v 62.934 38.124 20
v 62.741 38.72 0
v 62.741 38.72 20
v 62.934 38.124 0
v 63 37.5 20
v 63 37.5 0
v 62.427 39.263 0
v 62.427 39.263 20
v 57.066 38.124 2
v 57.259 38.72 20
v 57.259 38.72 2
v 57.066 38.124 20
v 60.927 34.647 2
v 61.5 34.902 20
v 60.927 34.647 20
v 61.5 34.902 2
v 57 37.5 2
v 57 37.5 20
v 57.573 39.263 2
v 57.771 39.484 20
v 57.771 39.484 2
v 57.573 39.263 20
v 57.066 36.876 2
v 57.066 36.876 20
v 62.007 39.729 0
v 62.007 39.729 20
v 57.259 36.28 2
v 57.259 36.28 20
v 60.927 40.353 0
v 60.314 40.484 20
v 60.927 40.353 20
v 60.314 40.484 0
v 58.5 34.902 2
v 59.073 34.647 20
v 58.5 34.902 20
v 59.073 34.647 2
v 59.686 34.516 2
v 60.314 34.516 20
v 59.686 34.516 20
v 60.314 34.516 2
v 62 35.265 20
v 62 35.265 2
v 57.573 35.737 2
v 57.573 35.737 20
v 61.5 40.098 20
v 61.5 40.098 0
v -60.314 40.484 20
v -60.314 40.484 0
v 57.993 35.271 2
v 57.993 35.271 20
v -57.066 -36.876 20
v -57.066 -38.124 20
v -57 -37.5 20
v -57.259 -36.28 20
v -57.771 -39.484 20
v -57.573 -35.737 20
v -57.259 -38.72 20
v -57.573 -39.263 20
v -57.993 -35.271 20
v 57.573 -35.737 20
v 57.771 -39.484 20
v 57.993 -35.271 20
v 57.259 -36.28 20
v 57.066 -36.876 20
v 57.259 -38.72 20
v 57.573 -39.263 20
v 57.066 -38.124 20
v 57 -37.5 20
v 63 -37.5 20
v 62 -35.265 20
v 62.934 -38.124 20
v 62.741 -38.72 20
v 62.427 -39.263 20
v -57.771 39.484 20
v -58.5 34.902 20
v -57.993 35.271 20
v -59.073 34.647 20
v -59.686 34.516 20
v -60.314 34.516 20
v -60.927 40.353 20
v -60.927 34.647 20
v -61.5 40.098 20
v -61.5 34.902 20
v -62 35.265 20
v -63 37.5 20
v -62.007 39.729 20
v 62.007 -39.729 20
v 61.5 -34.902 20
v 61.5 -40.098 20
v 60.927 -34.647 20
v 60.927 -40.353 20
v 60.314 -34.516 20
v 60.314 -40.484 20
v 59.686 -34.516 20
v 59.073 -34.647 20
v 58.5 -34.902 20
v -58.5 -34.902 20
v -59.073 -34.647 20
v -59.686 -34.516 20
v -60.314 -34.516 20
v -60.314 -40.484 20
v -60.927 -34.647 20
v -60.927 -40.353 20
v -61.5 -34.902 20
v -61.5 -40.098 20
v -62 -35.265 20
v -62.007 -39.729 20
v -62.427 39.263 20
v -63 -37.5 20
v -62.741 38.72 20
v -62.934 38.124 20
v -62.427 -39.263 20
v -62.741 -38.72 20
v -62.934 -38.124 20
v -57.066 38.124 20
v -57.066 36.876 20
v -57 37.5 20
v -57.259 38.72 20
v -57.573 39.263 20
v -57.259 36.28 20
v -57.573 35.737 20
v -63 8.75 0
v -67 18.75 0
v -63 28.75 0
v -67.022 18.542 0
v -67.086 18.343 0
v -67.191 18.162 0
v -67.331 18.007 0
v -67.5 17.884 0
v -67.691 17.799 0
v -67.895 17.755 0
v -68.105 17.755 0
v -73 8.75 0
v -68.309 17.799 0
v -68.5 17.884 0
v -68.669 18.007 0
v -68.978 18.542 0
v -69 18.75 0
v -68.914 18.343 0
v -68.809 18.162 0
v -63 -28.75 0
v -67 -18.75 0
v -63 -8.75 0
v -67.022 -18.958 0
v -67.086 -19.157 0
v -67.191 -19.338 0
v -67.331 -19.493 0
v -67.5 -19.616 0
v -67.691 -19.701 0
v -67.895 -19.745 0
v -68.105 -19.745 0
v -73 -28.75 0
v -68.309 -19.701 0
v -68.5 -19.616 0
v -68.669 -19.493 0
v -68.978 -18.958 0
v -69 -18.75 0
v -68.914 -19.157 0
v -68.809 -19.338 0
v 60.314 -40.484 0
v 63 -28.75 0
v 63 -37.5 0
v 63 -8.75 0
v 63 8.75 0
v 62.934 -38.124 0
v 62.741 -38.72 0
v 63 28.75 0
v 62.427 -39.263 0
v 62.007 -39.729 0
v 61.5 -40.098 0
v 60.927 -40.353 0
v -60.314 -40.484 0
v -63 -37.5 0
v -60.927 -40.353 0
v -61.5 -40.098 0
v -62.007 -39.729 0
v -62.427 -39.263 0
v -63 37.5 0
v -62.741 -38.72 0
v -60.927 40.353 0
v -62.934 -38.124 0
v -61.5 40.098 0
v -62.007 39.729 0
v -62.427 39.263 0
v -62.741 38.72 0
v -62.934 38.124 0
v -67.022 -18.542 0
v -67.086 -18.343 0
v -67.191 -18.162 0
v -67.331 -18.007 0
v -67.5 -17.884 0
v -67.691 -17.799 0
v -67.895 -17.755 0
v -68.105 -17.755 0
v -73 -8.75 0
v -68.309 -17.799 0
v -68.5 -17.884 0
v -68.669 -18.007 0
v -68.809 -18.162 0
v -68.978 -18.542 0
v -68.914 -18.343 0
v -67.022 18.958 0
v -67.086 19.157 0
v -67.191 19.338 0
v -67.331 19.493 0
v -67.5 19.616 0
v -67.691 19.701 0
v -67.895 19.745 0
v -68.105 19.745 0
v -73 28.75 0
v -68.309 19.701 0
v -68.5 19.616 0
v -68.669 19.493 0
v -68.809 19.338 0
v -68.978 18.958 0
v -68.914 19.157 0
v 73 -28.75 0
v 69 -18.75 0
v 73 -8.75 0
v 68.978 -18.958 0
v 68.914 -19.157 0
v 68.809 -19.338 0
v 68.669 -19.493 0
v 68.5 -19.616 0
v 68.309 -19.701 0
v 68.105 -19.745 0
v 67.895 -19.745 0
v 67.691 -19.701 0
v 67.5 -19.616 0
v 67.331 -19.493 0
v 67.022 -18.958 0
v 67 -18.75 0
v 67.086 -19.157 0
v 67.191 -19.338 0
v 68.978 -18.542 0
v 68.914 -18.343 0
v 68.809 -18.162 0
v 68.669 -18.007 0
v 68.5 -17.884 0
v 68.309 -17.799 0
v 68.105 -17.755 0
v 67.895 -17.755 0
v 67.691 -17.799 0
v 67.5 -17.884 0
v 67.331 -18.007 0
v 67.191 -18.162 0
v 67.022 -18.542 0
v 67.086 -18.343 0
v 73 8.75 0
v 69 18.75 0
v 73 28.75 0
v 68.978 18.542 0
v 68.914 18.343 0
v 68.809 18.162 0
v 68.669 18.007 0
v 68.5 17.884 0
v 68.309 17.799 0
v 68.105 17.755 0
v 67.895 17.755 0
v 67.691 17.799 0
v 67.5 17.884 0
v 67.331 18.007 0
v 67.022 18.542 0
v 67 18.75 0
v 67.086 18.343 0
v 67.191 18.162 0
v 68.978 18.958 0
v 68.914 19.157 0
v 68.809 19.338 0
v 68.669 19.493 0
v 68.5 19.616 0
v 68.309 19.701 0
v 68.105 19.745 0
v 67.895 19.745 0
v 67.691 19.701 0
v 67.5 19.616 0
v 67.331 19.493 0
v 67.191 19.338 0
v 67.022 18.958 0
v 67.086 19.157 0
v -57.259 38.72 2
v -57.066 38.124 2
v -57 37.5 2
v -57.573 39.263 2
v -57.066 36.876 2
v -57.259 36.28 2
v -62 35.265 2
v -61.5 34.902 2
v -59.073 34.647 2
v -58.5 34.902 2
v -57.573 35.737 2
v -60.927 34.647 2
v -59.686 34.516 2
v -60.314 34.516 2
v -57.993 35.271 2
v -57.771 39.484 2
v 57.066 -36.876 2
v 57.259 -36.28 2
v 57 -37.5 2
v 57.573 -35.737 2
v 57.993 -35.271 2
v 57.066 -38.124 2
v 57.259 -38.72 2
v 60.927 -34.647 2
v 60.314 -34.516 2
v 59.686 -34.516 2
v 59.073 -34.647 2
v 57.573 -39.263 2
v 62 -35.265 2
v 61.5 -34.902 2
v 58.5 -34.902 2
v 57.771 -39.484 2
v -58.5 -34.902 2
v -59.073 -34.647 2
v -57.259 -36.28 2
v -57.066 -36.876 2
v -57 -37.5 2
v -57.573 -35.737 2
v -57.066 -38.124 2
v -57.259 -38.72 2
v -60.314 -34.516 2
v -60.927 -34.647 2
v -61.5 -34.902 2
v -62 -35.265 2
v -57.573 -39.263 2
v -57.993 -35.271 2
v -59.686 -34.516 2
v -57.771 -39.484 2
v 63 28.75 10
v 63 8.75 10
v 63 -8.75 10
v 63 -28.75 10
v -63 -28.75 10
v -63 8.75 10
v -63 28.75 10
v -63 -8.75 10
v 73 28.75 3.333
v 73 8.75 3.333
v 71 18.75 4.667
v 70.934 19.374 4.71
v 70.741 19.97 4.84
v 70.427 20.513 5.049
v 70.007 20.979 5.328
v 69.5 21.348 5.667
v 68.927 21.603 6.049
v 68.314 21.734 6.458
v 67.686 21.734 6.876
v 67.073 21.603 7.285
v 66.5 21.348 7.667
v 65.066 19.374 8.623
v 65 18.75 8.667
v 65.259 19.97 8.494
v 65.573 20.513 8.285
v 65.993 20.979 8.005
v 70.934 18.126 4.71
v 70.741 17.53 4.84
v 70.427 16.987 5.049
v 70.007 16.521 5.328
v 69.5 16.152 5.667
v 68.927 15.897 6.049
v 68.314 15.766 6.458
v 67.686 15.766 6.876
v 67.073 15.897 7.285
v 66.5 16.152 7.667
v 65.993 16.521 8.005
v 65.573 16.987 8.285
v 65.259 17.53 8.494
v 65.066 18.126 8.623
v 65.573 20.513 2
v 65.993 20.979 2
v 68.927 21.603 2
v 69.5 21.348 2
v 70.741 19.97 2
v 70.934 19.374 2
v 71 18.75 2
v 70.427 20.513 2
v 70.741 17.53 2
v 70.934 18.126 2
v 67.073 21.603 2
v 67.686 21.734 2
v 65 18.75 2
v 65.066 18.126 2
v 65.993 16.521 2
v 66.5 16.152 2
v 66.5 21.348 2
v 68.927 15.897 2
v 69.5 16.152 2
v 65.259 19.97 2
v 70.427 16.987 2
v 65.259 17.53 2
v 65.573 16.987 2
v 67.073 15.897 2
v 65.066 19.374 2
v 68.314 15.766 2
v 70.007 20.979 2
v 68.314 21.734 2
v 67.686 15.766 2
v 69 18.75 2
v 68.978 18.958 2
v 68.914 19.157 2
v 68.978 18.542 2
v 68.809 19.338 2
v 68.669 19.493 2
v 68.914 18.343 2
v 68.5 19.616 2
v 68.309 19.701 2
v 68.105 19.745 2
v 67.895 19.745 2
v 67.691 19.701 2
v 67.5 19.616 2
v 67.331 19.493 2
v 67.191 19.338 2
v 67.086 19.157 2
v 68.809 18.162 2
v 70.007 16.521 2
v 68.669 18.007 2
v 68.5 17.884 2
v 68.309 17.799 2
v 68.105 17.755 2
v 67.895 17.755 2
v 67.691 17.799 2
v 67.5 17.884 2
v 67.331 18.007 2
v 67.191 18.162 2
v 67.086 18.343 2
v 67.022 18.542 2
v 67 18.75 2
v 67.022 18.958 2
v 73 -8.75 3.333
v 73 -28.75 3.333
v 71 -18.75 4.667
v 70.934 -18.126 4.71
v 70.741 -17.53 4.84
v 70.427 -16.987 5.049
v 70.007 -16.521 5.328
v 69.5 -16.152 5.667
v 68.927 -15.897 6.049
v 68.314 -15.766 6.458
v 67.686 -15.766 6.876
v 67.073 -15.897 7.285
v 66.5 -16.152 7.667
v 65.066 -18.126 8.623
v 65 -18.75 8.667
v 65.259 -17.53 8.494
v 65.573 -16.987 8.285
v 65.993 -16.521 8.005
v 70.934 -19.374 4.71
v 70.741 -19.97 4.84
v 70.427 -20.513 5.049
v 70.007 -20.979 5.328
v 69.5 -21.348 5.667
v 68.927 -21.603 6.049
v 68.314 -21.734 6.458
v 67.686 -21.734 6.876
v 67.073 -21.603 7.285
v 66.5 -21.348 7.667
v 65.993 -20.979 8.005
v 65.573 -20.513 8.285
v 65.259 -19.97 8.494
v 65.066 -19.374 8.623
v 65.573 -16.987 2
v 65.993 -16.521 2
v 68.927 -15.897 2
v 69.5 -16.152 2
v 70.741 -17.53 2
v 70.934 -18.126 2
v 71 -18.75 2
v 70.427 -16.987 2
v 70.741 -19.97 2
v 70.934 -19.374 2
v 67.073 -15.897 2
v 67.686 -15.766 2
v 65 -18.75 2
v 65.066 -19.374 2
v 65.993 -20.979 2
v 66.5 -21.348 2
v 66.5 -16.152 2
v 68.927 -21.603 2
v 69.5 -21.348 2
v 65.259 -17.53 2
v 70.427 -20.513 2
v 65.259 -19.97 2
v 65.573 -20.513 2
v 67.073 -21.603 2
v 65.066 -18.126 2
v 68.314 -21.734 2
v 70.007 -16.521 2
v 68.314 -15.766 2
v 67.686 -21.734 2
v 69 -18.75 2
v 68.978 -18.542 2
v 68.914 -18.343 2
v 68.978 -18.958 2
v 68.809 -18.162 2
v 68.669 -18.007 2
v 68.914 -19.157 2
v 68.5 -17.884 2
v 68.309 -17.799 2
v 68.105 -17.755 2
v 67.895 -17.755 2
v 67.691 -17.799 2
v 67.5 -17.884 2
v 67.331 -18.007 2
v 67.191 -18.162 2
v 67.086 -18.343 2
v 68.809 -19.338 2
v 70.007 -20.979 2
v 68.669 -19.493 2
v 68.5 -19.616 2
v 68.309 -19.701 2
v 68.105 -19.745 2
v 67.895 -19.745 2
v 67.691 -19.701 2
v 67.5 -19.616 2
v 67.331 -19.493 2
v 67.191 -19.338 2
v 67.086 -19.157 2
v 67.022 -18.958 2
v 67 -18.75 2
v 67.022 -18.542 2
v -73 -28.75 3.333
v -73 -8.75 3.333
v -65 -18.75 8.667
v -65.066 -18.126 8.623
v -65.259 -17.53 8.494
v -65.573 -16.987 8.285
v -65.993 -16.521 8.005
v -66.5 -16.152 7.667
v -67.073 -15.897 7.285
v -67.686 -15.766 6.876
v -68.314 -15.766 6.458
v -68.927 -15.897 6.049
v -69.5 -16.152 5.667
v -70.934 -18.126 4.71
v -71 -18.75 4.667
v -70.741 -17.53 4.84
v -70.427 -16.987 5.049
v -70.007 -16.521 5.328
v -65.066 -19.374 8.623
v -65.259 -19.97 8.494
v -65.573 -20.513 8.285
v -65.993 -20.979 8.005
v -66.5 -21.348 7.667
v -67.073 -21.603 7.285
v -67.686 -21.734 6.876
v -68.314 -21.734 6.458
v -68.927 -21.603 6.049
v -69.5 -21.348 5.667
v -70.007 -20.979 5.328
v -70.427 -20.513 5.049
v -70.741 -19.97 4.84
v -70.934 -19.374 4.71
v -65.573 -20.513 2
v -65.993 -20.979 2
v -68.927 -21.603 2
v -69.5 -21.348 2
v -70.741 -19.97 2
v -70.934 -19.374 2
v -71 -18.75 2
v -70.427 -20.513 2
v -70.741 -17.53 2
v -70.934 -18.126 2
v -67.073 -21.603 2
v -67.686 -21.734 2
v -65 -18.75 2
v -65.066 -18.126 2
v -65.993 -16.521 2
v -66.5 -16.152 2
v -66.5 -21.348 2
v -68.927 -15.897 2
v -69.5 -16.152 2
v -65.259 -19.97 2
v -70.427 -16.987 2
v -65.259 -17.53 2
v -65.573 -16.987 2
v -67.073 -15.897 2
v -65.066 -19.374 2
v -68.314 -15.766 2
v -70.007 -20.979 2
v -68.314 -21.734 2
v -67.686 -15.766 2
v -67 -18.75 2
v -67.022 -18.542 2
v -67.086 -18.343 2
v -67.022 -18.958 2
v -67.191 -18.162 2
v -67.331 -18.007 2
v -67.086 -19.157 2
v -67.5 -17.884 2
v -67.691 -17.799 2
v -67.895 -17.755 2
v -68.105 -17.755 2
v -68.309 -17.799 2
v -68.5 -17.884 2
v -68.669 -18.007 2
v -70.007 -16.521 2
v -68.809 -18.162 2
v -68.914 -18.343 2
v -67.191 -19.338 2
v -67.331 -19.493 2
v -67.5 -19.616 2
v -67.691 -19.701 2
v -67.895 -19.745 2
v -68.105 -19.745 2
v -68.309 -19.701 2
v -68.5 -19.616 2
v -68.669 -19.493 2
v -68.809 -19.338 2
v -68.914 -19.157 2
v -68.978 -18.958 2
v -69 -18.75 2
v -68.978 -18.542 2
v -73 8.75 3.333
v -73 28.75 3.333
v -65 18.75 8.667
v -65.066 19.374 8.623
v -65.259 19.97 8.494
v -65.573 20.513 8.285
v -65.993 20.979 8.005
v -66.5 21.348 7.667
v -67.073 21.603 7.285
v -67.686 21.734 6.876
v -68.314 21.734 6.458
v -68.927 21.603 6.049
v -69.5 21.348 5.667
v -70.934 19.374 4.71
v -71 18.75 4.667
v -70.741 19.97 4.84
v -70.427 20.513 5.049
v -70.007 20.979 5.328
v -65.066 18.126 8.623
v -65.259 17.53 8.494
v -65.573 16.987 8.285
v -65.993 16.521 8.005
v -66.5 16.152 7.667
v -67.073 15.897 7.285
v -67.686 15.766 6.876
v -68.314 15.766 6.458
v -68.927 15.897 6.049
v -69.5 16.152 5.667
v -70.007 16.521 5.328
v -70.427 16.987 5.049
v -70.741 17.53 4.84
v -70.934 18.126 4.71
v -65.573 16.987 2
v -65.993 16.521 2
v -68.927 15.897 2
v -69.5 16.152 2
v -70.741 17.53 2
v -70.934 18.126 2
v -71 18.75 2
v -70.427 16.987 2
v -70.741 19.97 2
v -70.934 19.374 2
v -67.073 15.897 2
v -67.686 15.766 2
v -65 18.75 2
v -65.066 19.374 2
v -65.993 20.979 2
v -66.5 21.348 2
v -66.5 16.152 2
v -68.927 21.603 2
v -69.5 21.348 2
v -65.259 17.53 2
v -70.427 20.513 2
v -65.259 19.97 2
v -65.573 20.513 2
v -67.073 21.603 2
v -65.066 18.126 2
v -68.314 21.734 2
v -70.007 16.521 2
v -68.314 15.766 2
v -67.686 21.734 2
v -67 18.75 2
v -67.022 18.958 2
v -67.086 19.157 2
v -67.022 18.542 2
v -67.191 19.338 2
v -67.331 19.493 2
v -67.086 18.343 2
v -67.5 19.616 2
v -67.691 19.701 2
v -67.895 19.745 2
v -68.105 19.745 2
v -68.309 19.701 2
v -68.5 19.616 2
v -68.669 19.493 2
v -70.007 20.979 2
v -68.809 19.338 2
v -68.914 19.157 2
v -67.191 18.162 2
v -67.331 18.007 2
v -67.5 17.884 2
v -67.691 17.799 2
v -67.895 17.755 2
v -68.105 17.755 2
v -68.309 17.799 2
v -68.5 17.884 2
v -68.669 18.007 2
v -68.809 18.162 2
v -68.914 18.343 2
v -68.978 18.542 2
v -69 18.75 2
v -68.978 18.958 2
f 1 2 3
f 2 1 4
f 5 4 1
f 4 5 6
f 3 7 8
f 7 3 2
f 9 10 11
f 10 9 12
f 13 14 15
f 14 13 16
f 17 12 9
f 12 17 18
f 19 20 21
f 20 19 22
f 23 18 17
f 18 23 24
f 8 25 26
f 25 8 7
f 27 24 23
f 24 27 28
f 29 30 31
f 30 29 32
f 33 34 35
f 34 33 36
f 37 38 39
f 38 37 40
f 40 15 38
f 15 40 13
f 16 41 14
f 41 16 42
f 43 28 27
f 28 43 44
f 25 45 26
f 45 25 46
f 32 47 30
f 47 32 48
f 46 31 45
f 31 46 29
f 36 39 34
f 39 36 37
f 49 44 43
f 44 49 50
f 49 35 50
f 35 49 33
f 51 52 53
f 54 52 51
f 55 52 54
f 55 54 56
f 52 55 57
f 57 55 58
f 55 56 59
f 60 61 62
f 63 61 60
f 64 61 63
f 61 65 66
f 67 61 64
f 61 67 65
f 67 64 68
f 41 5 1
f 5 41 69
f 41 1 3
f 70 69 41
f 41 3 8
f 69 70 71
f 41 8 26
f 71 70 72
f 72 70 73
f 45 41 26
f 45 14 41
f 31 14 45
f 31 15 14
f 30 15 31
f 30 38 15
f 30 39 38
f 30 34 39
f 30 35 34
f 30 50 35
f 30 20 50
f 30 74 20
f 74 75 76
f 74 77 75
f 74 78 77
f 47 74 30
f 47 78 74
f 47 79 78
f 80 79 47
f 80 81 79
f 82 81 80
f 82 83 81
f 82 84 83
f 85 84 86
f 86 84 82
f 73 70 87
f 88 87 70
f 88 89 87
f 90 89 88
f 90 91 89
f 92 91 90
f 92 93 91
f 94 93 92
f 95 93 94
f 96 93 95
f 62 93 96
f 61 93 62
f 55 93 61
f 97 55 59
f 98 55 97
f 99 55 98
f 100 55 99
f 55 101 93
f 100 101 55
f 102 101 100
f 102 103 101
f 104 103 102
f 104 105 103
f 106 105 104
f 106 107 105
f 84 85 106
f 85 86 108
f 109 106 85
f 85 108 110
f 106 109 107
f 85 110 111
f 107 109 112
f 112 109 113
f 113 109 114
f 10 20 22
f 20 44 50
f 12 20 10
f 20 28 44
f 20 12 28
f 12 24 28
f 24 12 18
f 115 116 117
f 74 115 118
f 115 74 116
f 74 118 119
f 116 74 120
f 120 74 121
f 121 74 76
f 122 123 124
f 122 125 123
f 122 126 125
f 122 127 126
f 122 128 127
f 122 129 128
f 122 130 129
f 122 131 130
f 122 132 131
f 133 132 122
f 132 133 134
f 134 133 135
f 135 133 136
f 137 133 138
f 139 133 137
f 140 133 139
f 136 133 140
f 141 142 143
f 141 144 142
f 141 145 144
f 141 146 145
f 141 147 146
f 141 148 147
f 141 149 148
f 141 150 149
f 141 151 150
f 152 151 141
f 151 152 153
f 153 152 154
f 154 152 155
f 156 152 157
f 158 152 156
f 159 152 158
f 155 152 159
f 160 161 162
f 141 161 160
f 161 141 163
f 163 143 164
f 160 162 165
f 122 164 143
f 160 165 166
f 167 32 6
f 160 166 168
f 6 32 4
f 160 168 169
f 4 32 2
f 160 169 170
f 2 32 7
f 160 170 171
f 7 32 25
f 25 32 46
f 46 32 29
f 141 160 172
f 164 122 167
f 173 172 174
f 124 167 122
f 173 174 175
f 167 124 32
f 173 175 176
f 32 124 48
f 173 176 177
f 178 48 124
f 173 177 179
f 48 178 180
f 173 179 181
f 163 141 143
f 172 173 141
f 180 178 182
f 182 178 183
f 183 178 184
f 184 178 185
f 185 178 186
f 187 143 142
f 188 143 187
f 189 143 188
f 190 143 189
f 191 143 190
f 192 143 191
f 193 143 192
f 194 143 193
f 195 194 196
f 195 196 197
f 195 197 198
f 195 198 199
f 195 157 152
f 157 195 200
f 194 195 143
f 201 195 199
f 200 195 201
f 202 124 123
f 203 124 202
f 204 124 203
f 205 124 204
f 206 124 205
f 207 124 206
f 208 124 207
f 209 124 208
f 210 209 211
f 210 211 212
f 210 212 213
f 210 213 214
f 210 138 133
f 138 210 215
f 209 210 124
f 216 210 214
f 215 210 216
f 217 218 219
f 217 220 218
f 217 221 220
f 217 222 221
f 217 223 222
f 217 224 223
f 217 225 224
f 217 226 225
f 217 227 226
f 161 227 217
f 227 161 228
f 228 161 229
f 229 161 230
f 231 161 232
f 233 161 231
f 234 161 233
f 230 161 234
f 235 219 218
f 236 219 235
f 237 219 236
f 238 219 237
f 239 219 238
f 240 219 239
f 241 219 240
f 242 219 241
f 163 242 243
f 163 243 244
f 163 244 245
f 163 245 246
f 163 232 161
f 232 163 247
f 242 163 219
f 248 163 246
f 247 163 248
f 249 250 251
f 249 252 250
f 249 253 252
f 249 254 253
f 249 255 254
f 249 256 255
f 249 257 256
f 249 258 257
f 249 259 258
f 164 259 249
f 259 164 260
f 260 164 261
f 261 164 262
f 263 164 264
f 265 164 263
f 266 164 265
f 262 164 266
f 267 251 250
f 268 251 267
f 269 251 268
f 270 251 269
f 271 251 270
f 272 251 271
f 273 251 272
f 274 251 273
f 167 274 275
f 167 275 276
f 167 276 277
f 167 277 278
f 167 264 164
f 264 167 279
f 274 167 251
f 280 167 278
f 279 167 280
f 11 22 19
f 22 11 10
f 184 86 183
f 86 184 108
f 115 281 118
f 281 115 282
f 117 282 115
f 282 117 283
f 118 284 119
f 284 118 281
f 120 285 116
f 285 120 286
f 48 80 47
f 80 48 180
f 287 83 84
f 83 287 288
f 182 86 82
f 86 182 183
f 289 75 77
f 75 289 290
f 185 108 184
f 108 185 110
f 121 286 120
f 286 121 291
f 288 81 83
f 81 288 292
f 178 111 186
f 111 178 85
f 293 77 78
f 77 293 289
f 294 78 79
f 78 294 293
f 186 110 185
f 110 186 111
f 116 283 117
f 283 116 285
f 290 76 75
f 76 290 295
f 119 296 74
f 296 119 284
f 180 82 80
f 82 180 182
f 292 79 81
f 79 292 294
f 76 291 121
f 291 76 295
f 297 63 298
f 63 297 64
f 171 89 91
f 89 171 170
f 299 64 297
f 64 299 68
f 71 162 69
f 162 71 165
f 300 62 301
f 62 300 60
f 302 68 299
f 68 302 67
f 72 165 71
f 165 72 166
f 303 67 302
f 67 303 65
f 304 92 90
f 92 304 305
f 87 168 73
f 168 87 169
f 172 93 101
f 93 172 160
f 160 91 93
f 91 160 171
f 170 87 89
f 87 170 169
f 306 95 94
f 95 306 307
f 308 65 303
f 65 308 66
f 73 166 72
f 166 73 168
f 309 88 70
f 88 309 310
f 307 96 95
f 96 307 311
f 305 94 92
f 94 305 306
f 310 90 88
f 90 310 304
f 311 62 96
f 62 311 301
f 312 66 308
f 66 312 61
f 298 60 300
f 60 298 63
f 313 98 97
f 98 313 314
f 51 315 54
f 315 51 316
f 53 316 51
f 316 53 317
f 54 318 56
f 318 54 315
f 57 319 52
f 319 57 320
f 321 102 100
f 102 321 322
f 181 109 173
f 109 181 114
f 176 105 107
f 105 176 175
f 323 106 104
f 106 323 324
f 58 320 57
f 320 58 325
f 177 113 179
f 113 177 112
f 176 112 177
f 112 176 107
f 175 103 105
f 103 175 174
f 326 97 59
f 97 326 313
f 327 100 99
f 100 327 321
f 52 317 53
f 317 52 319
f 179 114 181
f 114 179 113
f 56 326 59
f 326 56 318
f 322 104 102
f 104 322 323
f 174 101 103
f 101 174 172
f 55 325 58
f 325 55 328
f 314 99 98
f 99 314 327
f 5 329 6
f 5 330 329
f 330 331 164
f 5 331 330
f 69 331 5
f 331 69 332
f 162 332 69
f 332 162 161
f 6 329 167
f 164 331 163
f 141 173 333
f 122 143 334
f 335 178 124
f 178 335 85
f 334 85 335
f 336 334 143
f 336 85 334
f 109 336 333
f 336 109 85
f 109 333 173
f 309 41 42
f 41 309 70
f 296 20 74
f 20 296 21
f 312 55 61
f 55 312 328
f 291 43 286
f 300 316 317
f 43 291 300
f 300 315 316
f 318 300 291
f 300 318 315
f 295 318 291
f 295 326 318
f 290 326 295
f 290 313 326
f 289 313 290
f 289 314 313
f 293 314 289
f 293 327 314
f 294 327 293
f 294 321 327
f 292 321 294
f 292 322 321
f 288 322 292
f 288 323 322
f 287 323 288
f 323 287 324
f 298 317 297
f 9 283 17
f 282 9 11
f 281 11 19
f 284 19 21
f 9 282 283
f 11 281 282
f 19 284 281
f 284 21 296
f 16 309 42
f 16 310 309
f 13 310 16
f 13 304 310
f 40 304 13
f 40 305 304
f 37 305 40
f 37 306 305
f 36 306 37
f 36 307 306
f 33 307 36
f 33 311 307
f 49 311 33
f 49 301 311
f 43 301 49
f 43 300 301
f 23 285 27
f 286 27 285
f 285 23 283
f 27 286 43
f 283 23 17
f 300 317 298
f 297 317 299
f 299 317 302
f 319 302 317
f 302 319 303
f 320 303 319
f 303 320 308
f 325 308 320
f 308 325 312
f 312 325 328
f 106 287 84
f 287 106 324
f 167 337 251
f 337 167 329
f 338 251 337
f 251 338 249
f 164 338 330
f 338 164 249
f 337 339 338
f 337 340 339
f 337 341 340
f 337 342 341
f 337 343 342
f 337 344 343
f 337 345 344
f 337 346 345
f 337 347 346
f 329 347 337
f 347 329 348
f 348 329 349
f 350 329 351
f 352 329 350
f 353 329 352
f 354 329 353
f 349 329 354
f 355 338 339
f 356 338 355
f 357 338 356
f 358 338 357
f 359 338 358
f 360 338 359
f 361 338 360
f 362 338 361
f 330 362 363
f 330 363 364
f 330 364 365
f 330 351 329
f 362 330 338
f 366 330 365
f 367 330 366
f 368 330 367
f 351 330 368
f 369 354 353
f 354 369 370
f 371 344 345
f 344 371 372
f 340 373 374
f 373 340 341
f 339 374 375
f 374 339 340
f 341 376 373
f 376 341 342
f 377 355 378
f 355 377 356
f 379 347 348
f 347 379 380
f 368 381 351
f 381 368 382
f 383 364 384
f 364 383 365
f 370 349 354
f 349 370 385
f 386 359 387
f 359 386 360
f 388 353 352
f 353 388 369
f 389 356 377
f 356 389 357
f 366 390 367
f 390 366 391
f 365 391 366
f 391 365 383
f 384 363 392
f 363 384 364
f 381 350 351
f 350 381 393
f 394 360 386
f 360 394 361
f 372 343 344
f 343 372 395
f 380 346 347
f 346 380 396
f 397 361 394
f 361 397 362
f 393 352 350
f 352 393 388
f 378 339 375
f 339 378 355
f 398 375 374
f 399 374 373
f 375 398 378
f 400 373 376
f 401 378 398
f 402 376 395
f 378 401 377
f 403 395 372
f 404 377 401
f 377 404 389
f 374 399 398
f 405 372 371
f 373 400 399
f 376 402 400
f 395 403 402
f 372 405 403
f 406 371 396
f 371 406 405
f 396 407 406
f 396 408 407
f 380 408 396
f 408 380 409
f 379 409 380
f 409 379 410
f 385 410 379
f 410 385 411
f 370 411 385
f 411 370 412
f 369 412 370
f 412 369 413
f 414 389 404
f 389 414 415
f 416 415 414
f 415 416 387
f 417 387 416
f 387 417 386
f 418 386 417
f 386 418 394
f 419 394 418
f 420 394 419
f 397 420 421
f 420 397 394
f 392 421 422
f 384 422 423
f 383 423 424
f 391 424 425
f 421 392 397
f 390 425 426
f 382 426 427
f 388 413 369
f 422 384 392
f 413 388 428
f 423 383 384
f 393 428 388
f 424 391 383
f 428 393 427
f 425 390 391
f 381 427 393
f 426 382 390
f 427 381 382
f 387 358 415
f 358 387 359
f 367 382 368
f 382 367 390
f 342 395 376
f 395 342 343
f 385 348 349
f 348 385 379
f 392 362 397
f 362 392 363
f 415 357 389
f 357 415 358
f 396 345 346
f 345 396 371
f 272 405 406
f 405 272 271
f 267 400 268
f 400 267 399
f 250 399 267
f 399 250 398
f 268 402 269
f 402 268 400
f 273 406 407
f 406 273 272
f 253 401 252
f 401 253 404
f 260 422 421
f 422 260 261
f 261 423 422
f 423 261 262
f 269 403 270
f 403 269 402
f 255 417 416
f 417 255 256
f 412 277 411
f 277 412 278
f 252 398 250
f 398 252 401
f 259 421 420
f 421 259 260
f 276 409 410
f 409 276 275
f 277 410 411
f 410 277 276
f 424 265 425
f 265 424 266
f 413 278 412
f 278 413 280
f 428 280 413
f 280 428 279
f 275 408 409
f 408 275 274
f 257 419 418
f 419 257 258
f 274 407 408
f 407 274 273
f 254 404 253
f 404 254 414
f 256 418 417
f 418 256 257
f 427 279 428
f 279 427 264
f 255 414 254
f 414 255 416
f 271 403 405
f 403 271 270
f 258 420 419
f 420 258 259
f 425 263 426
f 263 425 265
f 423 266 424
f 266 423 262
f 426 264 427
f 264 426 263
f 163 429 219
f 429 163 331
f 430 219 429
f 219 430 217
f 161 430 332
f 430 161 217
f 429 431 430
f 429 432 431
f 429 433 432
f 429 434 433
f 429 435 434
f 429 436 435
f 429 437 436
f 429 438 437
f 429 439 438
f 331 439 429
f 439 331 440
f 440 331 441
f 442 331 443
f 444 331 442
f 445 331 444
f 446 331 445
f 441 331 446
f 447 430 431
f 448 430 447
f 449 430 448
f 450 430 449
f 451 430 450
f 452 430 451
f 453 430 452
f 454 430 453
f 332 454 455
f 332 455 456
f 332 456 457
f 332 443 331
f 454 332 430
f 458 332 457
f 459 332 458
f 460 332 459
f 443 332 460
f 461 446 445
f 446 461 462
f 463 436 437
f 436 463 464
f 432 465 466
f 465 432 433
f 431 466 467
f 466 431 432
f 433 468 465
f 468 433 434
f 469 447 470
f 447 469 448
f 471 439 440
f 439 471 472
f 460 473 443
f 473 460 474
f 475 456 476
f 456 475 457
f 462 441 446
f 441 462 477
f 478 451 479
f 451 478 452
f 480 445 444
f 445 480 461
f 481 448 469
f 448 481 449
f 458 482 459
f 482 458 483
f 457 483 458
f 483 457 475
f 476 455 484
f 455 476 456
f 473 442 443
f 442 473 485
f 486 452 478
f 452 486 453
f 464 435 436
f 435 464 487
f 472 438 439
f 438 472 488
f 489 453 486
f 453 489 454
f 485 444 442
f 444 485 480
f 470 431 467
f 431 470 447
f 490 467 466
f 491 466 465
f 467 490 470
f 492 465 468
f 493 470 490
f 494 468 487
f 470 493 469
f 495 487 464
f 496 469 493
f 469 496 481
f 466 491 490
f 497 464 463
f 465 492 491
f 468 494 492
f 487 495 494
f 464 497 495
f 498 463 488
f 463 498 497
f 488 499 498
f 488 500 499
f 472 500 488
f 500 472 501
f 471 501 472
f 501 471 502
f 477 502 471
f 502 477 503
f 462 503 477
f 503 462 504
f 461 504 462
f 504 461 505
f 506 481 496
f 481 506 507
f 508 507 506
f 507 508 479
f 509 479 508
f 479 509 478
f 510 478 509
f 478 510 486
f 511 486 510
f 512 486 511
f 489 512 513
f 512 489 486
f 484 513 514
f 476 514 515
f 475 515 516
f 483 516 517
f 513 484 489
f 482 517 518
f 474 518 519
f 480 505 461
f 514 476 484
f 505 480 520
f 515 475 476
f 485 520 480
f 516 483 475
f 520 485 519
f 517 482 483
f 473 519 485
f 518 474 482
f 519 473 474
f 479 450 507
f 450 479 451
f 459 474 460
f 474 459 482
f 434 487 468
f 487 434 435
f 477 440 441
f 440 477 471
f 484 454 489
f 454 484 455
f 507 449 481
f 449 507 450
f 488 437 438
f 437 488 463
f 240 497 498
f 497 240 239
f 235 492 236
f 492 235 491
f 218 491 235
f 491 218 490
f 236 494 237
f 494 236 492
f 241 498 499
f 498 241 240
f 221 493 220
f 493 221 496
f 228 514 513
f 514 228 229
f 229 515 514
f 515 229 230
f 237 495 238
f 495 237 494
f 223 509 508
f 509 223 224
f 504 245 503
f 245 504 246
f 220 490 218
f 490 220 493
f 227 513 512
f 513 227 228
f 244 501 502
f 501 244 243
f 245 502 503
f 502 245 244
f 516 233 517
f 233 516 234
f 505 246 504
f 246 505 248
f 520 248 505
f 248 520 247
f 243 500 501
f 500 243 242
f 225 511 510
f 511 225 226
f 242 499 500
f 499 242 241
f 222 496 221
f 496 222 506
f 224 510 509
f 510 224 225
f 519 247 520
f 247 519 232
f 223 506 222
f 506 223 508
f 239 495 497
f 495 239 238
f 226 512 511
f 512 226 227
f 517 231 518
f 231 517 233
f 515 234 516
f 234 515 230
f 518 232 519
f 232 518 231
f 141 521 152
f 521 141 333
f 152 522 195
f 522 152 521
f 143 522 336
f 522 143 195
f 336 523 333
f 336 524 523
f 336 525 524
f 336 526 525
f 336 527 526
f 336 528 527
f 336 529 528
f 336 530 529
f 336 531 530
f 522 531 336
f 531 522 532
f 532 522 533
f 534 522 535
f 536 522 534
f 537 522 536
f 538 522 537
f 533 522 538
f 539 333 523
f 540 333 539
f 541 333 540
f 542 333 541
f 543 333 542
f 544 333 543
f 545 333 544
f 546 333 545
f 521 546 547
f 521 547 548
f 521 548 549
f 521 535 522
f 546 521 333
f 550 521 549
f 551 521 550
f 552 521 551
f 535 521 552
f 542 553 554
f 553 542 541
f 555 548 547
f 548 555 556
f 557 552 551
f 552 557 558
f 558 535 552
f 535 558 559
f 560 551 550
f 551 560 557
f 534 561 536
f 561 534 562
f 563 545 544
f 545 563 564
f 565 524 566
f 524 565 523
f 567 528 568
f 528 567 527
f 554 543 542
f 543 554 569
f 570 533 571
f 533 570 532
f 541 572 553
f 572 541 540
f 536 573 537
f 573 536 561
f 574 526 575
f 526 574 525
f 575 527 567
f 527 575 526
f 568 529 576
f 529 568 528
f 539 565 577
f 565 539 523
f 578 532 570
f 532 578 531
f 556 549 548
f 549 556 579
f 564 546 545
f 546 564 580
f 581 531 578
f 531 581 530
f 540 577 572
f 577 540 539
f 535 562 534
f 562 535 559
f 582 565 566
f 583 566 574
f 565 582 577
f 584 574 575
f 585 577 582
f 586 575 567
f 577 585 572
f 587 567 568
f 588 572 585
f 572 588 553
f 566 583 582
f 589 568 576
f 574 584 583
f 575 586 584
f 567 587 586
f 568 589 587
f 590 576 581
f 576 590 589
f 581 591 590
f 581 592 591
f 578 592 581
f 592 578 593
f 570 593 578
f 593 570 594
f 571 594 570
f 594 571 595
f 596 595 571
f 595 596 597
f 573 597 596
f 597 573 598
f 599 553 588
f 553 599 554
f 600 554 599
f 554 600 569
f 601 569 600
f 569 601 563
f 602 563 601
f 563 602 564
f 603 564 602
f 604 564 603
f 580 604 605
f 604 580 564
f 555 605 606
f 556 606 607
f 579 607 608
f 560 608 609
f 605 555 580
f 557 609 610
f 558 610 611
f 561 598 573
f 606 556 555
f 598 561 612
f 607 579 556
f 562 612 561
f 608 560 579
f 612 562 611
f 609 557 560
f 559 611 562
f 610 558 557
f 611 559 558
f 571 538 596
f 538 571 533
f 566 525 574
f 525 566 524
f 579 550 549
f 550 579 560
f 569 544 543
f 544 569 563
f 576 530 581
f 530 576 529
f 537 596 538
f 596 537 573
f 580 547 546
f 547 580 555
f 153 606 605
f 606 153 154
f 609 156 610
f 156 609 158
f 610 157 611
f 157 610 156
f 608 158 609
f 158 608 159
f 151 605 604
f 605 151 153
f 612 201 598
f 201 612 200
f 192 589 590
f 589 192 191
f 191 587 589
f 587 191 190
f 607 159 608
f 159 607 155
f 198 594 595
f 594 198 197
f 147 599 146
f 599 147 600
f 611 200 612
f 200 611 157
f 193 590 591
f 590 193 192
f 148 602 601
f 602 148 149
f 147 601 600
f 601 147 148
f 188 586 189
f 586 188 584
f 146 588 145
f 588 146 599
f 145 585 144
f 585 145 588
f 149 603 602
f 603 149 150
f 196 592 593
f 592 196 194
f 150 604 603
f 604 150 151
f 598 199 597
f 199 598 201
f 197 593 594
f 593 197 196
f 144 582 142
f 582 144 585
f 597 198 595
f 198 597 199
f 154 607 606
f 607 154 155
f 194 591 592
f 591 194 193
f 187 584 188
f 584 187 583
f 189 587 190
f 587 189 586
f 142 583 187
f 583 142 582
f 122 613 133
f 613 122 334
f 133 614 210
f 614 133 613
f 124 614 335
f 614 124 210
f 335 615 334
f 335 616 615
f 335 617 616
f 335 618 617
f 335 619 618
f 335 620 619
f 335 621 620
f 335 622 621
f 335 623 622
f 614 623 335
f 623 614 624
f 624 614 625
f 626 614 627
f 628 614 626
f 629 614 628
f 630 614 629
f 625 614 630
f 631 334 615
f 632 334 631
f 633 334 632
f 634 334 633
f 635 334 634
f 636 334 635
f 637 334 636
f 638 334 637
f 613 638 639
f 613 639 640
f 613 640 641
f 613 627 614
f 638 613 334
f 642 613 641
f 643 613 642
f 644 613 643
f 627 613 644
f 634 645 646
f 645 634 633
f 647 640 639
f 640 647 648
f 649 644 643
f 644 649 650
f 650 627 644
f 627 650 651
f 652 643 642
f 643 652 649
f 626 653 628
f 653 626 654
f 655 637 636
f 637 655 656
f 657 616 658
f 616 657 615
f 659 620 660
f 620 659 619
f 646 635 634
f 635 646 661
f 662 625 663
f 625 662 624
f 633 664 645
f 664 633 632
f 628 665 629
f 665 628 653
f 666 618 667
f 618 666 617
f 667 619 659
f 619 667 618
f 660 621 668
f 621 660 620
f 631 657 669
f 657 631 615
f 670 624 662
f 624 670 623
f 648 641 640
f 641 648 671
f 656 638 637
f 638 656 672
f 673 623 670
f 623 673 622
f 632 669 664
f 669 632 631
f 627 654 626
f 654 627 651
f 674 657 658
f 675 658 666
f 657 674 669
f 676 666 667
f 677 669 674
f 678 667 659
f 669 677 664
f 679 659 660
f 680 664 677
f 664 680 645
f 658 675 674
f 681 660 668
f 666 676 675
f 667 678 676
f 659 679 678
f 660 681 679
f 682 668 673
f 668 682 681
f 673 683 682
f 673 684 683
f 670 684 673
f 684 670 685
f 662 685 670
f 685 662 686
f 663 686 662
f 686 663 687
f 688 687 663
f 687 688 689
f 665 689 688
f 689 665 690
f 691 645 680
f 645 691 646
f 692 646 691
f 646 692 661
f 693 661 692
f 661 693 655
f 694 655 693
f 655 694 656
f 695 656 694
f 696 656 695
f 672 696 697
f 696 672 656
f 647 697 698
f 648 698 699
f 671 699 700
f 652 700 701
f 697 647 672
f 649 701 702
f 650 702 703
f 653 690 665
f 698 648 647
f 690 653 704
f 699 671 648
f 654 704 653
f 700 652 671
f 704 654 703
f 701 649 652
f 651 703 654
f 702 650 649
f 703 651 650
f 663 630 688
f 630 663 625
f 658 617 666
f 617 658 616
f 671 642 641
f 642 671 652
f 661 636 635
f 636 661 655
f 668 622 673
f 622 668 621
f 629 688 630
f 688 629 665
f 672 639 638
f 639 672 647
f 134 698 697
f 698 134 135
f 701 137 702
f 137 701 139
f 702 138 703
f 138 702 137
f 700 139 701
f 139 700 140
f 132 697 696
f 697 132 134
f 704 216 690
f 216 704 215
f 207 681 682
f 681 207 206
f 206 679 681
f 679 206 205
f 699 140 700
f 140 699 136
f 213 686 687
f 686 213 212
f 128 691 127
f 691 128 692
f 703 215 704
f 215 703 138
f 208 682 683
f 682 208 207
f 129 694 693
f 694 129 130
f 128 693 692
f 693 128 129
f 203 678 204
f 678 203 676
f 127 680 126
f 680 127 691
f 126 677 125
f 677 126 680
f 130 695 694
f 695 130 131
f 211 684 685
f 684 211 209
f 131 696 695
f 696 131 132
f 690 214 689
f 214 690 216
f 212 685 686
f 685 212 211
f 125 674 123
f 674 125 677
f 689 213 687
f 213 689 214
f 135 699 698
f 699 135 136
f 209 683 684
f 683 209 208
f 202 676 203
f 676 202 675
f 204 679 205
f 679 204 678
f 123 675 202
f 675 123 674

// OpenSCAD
$fn=30;

module standoffs(h, r, x, y){
    translate([x/2, y/2]) cylinder(h, r, r);
    translate([-x/2, y/2]) cylinder(h, r, r);
    translate([x/2, -y/2]) cylinder(h, r, r);
    translate([-x/2, -y/2]) cylinder(h, r, r);
}

t = 2;
w = 120;
h = 75;
d = 20;

standoffs(d, 3, w, h);
difference() {
    hull() standoffs(d, 3, w, h);
    translate([0, 0, t]) hull() standoffs(d, 3, w-t, h-t);
}

module mount(h, w, d, t) {
    difference() {
        translate([-w, -h, d/2]) rotate([270, 0, 0]) linear_extrude(d) polygon([
            [0,0],
            [0,h],
            [w,h],
            [w,h/1.5],
        ]);
        translate([-w/2, 0, t]) cylinder(d, 3, 3);
        translate([-w/2, 0, -t]) cylinder(d, 1, 1);
    }
    
}

translate([w/2 + 10 + t*1.5, h/4]) mount(10, 10, 20, t);
translate([w/2 + 10 + t*1.5, -h/4]) mount(10, 10, 20, t);
rotate([180, 180]) translate([w/2 + 10 + t*1.5, h/4]) mount(10, 10, 20, t);
rotate([180, 180]) translate([w/2 + 10 + t*1.5, -h/4]) mount(10, 10, 20, t);
